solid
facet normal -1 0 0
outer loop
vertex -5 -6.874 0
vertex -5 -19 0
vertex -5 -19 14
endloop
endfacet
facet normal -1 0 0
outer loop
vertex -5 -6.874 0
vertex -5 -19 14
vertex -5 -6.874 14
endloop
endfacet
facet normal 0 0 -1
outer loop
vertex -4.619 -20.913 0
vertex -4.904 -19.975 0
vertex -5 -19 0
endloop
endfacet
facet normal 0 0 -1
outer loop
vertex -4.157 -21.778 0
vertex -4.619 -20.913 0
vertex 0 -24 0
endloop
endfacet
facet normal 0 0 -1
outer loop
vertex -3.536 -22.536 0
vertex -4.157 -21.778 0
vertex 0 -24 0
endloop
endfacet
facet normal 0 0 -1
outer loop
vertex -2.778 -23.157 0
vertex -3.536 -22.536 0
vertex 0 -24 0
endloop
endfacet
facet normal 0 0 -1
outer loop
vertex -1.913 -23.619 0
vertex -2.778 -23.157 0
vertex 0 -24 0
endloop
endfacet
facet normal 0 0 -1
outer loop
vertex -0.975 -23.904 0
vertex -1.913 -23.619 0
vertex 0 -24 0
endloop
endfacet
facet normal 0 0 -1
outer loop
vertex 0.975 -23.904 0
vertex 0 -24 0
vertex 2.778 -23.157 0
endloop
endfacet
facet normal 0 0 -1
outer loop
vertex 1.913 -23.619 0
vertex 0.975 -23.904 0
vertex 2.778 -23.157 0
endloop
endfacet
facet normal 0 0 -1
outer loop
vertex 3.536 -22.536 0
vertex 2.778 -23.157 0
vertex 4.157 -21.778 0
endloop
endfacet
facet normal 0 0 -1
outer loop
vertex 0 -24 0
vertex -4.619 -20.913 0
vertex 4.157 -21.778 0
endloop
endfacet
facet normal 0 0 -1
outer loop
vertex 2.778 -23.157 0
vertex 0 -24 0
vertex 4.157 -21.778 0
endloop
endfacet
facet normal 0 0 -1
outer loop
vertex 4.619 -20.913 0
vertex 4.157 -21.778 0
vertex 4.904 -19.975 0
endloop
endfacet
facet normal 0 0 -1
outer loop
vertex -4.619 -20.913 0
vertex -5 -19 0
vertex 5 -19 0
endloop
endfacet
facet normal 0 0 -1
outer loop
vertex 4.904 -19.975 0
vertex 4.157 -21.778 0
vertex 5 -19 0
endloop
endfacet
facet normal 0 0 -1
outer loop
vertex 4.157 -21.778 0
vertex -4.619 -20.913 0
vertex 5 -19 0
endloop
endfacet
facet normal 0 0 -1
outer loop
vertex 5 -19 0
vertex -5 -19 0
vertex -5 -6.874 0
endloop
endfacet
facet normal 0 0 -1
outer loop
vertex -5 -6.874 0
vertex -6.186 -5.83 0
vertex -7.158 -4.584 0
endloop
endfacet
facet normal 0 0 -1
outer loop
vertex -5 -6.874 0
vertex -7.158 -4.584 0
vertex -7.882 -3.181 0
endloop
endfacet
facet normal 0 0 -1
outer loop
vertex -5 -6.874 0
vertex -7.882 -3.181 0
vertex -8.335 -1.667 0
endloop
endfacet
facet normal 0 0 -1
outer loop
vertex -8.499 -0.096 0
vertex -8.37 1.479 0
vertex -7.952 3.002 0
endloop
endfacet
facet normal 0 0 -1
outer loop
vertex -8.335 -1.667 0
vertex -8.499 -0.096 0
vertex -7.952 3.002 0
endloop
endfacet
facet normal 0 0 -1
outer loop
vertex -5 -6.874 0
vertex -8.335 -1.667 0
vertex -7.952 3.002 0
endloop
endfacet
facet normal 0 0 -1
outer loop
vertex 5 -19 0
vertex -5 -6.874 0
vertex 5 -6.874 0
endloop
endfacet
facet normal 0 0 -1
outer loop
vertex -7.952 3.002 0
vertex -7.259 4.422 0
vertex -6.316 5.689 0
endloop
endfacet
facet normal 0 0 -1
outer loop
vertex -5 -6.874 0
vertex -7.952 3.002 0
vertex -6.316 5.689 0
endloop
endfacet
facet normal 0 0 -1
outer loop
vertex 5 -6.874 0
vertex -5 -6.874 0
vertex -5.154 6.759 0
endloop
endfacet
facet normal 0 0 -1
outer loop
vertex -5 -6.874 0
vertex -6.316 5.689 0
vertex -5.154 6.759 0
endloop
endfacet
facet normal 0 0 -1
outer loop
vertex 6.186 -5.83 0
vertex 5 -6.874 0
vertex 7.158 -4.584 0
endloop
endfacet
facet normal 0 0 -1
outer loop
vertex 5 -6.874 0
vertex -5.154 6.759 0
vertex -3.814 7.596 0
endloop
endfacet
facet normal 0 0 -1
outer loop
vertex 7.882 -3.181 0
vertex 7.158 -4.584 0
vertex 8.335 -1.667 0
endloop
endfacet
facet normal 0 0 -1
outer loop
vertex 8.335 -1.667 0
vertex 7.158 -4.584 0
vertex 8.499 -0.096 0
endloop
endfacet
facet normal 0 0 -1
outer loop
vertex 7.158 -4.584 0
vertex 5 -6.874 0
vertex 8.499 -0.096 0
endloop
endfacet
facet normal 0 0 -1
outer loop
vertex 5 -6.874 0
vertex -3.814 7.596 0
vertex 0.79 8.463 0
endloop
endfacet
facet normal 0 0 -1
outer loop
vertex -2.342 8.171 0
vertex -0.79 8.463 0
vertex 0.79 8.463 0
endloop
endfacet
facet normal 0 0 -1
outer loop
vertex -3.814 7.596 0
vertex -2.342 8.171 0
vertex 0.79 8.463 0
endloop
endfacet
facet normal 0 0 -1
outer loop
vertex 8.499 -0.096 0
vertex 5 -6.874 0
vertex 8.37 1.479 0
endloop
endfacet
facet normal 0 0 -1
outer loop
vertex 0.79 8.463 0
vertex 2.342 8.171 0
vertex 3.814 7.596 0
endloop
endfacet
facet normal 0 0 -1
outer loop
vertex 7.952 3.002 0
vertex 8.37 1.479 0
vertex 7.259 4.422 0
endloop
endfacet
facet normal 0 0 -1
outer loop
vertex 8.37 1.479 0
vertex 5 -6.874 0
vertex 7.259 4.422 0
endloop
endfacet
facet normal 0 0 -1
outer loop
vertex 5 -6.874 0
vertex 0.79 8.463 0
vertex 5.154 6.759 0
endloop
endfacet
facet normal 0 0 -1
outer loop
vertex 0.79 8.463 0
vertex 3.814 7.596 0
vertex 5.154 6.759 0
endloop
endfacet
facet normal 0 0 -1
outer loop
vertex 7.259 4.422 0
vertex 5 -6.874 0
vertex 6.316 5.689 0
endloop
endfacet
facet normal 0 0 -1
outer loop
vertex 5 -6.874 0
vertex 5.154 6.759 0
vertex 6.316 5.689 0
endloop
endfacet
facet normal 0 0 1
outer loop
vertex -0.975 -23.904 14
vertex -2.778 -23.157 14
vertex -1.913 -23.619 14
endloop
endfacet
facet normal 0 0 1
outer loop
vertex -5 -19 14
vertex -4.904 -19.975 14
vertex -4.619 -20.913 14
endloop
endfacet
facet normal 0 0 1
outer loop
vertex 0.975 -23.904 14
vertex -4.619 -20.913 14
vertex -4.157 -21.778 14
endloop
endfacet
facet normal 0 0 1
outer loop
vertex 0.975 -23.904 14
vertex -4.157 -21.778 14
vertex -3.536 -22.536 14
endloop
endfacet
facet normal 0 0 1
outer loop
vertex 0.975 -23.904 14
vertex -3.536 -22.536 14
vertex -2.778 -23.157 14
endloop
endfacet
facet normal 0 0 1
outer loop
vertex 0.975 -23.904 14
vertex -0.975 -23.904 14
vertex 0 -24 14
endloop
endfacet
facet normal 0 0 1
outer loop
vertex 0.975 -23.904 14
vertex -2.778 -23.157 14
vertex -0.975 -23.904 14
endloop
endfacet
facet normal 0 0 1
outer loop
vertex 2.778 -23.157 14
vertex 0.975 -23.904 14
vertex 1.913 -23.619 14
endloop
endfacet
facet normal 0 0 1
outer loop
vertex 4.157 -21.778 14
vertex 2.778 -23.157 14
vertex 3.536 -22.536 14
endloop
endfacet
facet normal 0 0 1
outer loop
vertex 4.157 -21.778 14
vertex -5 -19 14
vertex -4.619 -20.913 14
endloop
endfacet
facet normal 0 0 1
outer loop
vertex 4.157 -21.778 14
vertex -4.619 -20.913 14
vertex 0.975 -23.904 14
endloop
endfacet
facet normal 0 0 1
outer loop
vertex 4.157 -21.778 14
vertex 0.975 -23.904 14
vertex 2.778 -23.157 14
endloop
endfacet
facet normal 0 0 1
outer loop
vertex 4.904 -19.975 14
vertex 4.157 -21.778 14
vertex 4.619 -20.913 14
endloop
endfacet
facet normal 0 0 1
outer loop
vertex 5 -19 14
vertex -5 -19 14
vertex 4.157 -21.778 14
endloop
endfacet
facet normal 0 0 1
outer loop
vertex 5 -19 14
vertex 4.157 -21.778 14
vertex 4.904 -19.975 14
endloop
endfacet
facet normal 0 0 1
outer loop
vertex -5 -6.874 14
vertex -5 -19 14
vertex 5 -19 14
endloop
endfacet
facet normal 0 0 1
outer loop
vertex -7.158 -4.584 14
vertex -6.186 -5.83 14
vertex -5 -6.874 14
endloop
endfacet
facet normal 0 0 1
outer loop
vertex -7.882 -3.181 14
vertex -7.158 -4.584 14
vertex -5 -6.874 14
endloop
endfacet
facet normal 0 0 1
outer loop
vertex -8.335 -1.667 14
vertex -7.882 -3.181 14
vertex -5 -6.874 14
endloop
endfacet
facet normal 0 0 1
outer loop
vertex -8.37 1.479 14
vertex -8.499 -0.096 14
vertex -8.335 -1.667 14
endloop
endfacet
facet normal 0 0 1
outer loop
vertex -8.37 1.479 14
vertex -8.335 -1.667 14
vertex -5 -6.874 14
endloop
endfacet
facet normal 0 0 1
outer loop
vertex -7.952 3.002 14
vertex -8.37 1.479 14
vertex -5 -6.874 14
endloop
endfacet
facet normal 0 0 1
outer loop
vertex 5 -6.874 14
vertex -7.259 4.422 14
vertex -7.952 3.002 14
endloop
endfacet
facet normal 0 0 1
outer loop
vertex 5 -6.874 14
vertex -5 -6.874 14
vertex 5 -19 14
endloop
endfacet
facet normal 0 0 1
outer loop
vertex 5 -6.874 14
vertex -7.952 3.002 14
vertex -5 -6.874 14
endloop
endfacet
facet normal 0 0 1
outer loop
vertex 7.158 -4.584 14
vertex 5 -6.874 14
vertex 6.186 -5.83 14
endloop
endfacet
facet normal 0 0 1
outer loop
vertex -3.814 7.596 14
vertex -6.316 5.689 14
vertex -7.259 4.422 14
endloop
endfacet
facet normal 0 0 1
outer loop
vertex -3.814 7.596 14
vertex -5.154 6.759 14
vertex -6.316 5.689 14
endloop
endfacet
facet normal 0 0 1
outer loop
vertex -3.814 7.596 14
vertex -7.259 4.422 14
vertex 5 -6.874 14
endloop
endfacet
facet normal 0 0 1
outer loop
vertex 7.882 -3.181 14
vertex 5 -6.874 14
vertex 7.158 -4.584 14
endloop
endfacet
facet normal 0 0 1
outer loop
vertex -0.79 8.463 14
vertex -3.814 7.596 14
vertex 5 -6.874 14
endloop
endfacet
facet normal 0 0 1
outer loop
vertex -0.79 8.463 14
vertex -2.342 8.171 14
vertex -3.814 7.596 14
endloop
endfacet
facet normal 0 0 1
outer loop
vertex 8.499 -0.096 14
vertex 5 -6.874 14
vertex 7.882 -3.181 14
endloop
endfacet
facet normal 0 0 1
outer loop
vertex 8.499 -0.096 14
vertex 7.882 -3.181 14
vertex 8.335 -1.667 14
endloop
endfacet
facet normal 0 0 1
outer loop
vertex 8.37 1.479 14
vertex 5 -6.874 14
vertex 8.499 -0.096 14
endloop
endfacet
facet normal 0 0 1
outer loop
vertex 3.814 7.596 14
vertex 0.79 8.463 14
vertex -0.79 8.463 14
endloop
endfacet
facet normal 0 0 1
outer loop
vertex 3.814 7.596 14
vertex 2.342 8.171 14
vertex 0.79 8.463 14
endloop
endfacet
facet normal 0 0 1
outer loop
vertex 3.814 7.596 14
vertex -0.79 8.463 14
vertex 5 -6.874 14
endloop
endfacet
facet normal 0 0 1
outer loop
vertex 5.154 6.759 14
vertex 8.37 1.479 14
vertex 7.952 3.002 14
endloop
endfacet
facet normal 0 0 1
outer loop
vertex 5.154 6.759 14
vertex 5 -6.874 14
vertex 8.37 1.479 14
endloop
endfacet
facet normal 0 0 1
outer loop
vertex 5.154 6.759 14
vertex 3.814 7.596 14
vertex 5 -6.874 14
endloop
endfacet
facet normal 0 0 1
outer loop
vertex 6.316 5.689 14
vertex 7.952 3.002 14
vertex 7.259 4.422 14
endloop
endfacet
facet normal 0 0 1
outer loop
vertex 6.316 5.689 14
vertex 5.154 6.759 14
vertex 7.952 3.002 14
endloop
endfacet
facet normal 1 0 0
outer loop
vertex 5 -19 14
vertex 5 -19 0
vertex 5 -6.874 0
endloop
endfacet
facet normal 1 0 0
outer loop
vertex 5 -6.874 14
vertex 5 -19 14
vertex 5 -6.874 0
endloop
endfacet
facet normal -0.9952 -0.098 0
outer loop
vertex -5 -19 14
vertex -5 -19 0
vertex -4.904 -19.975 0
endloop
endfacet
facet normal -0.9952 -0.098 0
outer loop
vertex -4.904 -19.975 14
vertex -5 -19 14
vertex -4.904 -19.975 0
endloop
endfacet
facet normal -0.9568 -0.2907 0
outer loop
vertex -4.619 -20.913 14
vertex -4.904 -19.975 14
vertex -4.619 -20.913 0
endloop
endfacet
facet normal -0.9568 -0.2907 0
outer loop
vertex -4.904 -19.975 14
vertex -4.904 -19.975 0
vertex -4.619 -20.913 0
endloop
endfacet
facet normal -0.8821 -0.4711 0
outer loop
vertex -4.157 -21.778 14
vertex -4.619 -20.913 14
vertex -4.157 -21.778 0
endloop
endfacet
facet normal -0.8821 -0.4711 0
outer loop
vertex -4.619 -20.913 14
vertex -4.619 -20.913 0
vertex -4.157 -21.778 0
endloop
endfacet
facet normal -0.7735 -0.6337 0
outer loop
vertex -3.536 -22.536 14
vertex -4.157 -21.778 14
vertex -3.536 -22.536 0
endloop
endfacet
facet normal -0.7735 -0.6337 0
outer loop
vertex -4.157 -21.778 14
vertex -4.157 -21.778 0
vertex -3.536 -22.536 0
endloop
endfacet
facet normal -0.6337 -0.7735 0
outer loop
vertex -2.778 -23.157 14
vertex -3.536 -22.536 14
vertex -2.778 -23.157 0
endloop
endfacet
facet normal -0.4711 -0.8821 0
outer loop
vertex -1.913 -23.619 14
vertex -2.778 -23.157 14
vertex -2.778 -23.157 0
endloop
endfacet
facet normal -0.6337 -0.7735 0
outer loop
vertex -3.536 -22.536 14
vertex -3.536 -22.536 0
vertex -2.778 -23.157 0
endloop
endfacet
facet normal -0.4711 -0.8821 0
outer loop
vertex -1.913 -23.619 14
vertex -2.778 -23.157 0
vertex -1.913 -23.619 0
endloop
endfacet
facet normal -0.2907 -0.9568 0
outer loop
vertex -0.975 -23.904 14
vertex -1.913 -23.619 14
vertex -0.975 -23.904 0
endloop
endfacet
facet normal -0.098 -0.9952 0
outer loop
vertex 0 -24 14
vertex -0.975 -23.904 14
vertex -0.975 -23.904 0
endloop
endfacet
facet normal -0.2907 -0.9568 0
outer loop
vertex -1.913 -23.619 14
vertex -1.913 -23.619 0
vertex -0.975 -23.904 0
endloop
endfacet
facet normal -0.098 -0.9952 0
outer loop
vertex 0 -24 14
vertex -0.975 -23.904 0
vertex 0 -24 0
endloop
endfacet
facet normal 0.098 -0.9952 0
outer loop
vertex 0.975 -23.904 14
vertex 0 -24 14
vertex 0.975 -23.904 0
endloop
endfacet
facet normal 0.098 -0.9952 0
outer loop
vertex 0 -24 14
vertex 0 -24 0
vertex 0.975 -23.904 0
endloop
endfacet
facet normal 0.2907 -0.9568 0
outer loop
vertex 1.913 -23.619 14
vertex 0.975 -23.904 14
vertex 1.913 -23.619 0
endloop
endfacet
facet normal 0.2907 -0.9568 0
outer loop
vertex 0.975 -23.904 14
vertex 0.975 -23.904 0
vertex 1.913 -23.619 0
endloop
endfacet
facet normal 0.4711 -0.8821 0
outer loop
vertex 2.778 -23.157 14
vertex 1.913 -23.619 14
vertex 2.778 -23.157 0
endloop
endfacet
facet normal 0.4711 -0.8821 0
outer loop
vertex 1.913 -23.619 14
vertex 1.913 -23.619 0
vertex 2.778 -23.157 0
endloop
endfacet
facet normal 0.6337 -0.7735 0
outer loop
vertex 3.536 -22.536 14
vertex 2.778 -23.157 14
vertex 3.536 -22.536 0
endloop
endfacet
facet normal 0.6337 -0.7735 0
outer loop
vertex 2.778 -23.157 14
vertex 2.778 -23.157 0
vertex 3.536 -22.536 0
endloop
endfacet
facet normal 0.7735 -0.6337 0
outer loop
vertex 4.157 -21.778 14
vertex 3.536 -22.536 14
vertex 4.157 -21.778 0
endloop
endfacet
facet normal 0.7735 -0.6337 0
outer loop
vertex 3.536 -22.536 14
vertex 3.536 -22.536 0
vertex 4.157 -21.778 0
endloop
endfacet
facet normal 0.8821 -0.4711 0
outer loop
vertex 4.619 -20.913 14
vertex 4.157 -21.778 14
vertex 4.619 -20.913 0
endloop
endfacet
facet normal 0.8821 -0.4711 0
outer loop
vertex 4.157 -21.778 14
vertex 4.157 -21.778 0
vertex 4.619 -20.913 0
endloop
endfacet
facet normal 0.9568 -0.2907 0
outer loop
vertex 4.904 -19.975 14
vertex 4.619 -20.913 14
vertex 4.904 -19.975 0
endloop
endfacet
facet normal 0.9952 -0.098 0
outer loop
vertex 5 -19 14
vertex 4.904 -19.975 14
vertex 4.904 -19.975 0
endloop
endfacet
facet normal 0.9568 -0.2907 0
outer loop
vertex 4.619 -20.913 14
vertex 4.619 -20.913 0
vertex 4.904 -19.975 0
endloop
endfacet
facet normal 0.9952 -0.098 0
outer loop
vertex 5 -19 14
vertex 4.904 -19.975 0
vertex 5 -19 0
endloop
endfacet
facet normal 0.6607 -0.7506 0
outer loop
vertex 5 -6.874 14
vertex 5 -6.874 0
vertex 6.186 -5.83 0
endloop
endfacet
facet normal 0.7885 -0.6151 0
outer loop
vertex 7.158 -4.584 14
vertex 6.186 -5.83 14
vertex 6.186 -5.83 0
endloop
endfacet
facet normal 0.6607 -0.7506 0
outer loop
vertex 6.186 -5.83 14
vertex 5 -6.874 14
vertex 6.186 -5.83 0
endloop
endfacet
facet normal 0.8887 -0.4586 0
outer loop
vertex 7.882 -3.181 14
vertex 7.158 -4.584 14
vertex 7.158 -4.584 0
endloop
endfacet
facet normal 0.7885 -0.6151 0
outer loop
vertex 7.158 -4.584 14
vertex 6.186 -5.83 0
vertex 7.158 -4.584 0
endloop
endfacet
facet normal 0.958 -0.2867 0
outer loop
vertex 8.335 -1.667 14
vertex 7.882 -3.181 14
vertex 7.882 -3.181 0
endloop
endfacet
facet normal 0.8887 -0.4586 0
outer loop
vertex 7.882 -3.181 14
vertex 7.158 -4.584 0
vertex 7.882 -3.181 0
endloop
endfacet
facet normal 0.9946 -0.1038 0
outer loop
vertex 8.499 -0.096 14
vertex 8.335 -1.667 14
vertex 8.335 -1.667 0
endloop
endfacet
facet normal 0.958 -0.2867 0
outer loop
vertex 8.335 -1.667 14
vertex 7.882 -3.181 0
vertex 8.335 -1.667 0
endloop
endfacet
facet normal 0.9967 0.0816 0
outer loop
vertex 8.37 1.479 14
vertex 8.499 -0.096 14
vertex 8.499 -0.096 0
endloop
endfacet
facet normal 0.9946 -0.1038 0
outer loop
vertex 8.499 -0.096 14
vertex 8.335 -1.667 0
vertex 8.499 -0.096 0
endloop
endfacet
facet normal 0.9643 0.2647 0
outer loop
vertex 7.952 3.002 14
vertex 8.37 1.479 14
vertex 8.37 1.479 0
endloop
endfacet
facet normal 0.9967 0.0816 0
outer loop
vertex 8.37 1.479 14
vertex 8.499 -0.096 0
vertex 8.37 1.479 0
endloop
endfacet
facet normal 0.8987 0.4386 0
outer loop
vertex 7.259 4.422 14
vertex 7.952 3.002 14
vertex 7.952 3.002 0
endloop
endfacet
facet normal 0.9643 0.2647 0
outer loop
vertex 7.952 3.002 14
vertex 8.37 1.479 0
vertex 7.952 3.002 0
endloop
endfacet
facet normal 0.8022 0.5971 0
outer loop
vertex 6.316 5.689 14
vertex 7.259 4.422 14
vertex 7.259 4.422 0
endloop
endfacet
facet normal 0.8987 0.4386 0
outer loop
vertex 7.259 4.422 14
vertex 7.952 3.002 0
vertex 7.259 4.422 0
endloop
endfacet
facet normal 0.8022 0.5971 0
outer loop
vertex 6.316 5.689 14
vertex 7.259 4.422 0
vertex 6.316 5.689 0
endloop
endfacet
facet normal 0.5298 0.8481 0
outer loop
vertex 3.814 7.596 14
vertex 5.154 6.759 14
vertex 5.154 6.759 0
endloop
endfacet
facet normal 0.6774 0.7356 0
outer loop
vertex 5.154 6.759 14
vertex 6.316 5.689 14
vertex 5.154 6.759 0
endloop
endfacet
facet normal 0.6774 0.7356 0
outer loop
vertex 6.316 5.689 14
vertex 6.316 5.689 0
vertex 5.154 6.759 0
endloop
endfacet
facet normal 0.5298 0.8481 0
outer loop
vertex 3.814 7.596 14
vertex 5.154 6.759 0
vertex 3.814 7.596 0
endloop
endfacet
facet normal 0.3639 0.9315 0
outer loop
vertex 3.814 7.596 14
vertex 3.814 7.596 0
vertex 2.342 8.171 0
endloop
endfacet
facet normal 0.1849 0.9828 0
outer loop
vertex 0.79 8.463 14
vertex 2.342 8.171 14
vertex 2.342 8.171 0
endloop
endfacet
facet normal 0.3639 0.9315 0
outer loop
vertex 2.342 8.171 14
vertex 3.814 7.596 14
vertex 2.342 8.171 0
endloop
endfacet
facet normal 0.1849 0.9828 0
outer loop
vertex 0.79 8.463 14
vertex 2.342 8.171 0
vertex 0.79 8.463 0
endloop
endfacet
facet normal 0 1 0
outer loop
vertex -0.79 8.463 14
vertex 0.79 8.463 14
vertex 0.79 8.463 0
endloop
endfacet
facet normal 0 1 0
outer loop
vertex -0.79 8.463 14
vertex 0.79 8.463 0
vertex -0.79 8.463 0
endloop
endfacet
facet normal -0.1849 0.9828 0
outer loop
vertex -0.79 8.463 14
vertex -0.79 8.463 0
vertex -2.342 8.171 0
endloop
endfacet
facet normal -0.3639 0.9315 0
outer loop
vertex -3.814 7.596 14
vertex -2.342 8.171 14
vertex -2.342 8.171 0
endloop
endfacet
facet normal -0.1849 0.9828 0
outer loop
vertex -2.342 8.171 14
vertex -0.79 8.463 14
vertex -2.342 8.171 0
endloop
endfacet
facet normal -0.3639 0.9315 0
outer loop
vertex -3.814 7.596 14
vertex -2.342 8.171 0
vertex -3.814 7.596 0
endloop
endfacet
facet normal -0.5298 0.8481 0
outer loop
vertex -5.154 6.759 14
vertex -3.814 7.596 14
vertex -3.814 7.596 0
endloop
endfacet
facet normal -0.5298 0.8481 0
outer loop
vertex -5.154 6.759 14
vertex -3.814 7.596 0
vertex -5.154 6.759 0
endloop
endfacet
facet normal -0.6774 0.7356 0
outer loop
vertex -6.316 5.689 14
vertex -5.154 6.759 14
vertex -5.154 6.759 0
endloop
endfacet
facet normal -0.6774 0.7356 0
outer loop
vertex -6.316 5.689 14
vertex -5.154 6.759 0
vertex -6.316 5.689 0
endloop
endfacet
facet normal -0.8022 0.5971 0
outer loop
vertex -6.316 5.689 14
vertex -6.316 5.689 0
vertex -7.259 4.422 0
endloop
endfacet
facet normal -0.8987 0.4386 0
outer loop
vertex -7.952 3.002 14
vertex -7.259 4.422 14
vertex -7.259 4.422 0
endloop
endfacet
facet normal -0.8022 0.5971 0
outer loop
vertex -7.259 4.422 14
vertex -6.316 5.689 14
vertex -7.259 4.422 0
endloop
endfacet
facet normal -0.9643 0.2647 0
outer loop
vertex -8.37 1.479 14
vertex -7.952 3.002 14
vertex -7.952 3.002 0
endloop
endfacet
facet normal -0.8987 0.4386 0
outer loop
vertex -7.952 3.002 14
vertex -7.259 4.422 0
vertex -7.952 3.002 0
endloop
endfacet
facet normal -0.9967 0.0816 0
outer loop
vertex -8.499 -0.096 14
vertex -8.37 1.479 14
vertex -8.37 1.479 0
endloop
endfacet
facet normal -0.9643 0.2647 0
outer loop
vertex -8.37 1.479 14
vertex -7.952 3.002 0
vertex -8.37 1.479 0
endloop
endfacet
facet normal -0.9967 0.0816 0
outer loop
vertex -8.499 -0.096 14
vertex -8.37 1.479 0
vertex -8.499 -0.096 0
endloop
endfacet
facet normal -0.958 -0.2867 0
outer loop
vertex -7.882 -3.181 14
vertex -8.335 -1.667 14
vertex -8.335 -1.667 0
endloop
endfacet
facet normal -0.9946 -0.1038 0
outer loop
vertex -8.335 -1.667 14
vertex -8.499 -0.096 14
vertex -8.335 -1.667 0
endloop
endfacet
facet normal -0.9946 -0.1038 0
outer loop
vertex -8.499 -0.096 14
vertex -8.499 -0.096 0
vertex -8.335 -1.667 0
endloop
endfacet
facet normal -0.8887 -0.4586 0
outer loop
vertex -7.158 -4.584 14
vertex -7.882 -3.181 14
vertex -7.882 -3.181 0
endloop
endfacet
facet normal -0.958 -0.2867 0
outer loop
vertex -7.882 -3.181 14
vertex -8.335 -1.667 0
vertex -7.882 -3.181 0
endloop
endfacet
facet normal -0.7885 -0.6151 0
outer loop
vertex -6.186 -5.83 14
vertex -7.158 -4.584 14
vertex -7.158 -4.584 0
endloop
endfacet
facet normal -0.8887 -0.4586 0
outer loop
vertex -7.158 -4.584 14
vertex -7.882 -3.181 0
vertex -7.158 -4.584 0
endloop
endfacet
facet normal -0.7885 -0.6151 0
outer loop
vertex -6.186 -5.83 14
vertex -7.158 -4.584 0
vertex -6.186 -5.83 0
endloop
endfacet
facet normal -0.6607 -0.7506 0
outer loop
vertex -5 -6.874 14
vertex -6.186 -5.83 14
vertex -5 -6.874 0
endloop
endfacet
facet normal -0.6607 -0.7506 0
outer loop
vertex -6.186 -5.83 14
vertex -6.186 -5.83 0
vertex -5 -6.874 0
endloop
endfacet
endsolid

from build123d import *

# Parameters (mm, degrees)
CYLINDER007_R     = 5
CYLINDER007_DEPTH = 14
CYLINDER006_R     = 8.5
CYLINDER006_DEPTH = 14
BOX006_W          = 10
BOX006_H          = 13
BOX006_DEPTH      = 14


with BuildPart() as lock_cut_bottom001:
    # Cylinder007 → Cylinder007 (new body)
    with BuildSketch(Plane(origin=(0, -11, 0), x_dir=(1, 0, 0), z_dir=(0, 0, 1))):
        Circle(CYLINDER007_R)
    extrude(amount=CYLINDER007_DEPTH)


with BuildPart() as lock_cut_top001:
    # Cylinder006 → Cylinder006 (new body)
    with BuildSketch(Plane(origin=(0, 8, 0), x_dir=(1, 0, 0), z_dir=(0, 0, 1))):
        Circle(CYLINDER006_R)
    extrude(amount=CYLINDER006_DEPTH)


with BuildPart() as lock:
    # Box006 → Box006 (new body)
    with BuildSketch(Plane(origin=(-5, -11, 0), x_dir=(1, 0, 0), z_dir=(0, 0, 1))):
        with Locations((5, 6.5)):
            Rectangle(BOX006_W, BOX006_H)
    extrude(amount=BOX006_DEPTH)

    # Fusion004: union lock cut bottom001, lock cut top001
    add(lock_cut_bottom001.part)
    add(lock_cut_top001.part)


with BuildPart() as lock_1:
    # Fusion004 placement: moved
    add(lock.part.moved(Location((0, -8, 0))))


solid = lock_1.part
